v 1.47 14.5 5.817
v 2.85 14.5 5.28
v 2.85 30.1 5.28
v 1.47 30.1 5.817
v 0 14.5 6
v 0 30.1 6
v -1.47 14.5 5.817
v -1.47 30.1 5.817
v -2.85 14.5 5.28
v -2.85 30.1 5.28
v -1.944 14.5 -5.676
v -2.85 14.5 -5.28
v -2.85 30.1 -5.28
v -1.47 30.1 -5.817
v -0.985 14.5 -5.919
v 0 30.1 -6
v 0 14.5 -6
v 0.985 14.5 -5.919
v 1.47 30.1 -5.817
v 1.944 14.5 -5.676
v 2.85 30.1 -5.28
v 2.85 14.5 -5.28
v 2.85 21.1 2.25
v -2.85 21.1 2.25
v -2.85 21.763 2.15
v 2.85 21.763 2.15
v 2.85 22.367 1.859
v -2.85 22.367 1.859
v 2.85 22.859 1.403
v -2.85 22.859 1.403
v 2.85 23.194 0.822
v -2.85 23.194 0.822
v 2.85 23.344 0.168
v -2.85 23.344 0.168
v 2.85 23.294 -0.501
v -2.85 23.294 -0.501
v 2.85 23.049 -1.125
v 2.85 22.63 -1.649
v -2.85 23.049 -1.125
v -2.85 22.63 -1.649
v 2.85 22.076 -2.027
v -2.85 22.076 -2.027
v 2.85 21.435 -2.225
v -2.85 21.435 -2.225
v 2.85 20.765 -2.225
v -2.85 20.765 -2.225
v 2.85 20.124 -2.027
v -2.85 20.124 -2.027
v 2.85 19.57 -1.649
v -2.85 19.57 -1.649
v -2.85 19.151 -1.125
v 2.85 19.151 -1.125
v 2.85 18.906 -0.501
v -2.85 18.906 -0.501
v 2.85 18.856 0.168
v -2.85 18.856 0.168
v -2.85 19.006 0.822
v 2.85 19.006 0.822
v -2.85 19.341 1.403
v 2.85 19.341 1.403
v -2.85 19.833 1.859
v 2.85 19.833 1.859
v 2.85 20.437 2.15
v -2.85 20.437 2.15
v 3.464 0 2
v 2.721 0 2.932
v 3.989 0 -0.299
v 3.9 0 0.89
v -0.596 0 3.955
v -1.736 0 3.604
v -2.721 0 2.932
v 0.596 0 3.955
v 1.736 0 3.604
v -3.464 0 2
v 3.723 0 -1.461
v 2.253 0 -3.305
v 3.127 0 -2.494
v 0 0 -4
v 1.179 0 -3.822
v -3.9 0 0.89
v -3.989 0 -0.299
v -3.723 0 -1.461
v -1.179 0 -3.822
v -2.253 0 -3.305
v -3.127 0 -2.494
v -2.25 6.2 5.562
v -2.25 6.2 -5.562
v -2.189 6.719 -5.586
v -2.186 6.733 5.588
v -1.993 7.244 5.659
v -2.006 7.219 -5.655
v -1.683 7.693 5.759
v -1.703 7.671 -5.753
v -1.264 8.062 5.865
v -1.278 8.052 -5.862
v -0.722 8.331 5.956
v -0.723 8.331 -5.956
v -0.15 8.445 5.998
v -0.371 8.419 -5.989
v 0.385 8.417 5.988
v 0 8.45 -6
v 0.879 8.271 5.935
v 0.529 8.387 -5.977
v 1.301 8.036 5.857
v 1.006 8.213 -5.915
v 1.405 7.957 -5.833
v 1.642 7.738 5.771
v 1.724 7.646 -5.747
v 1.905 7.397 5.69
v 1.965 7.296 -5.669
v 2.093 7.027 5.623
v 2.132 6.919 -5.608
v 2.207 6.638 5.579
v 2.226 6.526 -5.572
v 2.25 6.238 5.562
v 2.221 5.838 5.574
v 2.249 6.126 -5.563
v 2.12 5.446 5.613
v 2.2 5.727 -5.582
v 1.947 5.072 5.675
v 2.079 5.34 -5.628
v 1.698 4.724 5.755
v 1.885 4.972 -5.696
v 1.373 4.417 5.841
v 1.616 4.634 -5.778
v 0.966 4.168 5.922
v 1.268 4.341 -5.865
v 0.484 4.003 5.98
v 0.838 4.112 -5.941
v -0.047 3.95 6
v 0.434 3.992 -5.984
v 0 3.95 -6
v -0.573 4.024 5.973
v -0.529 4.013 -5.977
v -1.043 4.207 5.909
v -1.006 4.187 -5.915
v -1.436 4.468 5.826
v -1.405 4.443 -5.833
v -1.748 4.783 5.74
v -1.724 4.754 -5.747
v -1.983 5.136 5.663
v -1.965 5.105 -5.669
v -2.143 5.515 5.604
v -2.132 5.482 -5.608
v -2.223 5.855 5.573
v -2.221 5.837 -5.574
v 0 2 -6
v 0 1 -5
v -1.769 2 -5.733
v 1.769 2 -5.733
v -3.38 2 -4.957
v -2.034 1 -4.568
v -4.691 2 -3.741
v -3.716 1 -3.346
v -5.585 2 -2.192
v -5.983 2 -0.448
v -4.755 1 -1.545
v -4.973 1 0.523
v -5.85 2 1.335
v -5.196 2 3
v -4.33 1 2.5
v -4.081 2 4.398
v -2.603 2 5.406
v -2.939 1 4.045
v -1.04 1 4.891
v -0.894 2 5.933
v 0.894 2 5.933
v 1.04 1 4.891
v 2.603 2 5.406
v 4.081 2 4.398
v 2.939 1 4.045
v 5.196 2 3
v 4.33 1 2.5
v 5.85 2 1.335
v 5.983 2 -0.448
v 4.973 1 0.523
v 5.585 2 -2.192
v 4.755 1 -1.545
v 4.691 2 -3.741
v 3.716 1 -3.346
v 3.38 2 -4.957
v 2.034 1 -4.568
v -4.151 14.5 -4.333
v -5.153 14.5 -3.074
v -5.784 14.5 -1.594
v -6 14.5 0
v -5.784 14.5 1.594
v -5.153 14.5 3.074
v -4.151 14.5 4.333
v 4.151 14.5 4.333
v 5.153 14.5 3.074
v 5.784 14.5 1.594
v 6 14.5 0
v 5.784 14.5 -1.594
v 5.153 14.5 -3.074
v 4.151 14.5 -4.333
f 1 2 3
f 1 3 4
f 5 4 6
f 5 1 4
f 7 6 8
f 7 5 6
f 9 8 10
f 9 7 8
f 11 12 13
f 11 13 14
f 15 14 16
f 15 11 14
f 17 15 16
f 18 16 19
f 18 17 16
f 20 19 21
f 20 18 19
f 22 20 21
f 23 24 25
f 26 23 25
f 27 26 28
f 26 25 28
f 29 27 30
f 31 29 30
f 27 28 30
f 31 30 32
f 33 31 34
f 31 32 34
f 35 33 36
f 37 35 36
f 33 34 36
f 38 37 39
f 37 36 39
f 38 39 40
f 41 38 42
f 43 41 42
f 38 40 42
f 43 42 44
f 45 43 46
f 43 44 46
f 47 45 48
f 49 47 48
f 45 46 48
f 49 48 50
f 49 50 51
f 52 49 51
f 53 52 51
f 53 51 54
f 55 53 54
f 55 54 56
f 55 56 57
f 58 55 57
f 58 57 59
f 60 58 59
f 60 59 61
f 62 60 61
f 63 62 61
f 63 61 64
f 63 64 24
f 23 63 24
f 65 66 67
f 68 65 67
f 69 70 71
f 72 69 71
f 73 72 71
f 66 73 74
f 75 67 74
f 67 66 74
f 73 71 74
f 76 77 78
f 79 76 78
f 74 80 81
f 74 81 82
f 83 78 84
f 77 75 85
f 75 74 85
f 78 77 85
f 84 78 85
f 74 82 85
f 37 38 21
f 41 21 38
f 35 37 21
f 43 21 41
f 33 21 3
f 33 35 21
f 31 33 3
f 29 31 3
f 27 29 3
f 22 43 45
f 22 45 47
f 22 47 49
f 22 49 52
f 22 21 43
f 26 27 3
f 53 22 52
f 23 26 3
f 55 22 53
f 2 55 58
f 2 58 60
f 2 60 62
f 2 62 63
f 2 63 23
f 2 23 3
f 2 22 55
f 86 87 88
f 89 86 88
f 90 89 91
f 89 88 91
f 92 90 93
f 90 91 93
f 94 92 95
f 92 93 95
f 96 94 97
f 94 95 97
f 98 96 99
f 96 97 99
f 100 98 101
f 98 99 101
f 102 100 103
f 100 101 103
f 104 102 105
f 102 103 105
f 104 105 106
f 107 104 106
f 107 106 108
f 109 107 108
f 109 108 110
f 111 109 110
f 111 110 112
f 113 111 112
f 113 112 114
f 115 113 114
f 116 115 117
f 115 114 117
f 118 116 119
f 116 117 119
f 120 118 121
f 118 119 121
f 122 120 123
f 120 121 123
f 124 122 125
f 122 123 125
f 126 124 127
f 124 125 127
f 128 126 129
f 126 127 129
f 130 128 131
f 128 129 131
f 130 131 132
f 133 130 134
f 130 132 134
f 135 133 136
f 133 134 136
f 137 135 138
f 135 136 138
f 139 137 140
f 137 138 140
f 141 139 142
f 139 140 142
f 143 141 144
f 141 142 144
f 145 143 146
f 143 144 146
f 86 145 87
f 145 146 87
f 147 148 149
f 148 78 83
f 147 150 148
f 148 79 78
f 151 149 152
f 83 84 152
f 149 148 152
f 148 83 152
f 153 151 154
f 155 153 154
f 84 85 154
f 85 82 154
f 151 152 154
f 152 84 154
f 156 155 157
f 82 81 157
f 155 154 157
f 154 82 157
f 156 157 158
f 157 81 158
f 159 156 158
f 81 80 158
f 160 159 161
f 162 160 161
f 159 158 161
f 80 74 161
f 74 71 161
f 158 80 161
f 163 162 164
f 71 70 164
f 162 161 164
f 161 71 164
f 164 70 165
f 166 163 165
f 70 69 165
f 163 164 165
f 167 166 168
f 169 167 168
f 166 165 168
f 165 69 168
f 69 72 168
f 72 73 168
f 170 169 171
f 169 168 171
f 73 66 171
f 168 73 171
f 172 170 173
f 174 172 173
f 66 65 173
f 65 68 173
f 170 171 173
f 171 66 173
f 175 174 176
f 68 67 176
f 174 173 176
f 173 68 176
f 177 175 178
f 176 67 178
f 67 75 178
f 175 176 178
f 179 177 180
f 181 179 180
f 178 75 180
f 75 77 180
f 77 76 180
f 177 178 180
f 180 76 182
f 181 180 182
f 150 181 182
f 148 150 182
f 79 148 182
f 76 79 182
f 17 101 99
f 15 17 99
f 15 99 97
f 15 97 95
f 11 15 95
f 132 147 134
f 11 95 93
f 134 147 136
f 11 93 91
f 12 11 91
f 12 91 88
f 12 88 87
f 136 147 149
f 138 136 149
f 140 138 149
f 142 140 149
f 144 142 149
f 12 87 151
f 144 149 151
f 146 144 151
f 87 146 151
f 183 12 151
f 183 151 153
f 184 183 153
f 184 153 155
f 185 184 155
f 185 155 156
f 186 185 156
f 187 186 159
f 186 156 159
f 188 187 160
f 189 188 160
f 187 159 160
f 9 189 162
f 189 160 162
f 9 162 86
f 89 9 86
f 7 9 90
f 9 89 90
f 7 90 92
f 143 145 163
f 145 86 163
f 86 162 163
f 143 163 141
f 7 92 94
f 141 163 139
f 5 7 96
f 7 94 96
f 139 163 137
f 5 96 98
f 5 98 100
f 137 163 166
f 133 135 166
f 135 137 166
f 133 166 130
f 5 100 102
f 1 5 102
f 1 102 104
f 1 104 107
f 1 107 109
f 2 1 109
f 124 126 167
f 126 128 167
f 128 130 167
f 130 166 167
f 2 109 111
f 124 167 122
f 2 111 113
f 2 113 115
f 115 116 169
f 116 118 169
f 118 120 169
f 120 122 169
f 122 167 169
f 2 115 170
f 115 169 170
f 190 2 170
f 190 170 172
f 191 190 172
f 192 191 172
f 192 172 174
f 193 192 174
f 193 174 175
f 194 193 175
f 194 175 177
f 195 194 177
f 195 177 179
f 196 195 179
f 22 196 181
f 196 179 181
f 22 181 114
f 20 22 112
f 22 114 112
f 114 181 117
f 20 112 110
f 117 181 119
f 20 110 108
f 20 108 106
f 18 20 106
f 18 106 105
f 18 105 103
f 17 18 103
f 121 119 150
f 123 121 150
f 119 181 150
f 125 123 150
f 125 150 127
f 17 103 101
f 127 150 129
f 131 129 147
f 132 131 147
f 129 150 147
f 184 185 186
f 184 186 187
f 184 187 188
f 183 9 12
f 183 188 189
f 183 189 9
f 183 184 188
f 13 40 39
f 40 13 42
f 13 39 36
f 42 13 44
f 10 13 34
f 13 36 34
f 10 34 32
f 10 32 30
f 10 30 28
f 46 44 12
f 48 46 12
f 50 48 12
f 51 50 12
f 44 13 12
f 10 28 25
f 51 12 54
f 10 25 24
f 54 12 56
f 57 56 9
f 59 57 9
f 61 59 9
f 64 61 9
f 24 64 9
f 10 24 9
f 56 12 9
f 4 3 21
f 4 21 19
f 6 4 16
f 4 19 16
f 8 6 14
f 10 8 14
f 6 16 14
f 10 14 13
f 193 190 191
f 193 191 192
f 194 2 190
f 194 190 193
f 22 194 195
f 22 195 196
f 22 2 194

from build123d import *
from build123d.topology import SkipClean

# Parameters (mm, degrees)
SKETCH2_R            = 6
BOSS_EXTRUDE1_DEPTH  = 14.5
CHAMFER1_SIZE        = 2
BOSS_EXTRUDE3_DEPTH  = 15.6
M4_CLEARANCE_HOLE1_D = 4.5
M4_CLEARANCE_HOLE2_D = 4.5


with BuildPart() as part:
    # Sketch2 → Boss-Extrude1 (new body)
    with BuildSketch(Plane(origin=(0, 0, 0), x_dir=(1, 0, 0), z_dir=(0, 1, 0))):
        with Locations(Location((0, 0, 0), (0, 0, 90))):
            Circle(SKETCH2_R)
    extrude(amount=BOSS_EXTRUDE1_DEPTH)

    # Chamfer1
    chamfer1_edges = [part.edges().sort_by_distance(p)[0] for p in [
        (0, 0, 6),
    ]]
    chamfer(chamfer1_edges, length=CHAMFER1_SIZE)

    # Sketch3 → Boss-Extrude3 (add)
    with SkipClean():  # the faces are left unmerged after this step: merging them gives an invalid solid
        with BuildSketch(Plane(origin=(0, 14.5, 0), x_dir=(1, 0, 0), z_dir=(0, 1, 0))):
            with BuildLine():
                Line((-2.85, 0), (-2.85, 5.279915))
                ThreePointArc((-2.85, 5.279915), (0, 6), (2.85, 5.279915))
                Line((2.85, 5.279915), (2.85, -5.279915))
                ThreePointArc((2.85, -5.279915), (0, -6), (-2.85, -5.279915))
                Line((-2.85, -5.279915), (-2.85, 0))
            make_face()
        extrude(amount=BOSS_EXTRUDE3_DEPTH)

    # M4 Clearance Hole1 (through all)
    with Locations(Plane.XY.offset(6)):
        with Locations((0, 6.2)):
            Hole(M4_CLEARANCE_HOLE1_D / 2)

    # M4 Clearance Hole2 (through all)
    with Locations(Plane(origin=(2.85, 0, 0), x_dir=(0, 0, -1), z_dir=(1, 0, 0))):
        with Locations((0, 21.1)):
            Hole(M4_CLEARANCE_HOLE2_D / 2)


solid = part.part
